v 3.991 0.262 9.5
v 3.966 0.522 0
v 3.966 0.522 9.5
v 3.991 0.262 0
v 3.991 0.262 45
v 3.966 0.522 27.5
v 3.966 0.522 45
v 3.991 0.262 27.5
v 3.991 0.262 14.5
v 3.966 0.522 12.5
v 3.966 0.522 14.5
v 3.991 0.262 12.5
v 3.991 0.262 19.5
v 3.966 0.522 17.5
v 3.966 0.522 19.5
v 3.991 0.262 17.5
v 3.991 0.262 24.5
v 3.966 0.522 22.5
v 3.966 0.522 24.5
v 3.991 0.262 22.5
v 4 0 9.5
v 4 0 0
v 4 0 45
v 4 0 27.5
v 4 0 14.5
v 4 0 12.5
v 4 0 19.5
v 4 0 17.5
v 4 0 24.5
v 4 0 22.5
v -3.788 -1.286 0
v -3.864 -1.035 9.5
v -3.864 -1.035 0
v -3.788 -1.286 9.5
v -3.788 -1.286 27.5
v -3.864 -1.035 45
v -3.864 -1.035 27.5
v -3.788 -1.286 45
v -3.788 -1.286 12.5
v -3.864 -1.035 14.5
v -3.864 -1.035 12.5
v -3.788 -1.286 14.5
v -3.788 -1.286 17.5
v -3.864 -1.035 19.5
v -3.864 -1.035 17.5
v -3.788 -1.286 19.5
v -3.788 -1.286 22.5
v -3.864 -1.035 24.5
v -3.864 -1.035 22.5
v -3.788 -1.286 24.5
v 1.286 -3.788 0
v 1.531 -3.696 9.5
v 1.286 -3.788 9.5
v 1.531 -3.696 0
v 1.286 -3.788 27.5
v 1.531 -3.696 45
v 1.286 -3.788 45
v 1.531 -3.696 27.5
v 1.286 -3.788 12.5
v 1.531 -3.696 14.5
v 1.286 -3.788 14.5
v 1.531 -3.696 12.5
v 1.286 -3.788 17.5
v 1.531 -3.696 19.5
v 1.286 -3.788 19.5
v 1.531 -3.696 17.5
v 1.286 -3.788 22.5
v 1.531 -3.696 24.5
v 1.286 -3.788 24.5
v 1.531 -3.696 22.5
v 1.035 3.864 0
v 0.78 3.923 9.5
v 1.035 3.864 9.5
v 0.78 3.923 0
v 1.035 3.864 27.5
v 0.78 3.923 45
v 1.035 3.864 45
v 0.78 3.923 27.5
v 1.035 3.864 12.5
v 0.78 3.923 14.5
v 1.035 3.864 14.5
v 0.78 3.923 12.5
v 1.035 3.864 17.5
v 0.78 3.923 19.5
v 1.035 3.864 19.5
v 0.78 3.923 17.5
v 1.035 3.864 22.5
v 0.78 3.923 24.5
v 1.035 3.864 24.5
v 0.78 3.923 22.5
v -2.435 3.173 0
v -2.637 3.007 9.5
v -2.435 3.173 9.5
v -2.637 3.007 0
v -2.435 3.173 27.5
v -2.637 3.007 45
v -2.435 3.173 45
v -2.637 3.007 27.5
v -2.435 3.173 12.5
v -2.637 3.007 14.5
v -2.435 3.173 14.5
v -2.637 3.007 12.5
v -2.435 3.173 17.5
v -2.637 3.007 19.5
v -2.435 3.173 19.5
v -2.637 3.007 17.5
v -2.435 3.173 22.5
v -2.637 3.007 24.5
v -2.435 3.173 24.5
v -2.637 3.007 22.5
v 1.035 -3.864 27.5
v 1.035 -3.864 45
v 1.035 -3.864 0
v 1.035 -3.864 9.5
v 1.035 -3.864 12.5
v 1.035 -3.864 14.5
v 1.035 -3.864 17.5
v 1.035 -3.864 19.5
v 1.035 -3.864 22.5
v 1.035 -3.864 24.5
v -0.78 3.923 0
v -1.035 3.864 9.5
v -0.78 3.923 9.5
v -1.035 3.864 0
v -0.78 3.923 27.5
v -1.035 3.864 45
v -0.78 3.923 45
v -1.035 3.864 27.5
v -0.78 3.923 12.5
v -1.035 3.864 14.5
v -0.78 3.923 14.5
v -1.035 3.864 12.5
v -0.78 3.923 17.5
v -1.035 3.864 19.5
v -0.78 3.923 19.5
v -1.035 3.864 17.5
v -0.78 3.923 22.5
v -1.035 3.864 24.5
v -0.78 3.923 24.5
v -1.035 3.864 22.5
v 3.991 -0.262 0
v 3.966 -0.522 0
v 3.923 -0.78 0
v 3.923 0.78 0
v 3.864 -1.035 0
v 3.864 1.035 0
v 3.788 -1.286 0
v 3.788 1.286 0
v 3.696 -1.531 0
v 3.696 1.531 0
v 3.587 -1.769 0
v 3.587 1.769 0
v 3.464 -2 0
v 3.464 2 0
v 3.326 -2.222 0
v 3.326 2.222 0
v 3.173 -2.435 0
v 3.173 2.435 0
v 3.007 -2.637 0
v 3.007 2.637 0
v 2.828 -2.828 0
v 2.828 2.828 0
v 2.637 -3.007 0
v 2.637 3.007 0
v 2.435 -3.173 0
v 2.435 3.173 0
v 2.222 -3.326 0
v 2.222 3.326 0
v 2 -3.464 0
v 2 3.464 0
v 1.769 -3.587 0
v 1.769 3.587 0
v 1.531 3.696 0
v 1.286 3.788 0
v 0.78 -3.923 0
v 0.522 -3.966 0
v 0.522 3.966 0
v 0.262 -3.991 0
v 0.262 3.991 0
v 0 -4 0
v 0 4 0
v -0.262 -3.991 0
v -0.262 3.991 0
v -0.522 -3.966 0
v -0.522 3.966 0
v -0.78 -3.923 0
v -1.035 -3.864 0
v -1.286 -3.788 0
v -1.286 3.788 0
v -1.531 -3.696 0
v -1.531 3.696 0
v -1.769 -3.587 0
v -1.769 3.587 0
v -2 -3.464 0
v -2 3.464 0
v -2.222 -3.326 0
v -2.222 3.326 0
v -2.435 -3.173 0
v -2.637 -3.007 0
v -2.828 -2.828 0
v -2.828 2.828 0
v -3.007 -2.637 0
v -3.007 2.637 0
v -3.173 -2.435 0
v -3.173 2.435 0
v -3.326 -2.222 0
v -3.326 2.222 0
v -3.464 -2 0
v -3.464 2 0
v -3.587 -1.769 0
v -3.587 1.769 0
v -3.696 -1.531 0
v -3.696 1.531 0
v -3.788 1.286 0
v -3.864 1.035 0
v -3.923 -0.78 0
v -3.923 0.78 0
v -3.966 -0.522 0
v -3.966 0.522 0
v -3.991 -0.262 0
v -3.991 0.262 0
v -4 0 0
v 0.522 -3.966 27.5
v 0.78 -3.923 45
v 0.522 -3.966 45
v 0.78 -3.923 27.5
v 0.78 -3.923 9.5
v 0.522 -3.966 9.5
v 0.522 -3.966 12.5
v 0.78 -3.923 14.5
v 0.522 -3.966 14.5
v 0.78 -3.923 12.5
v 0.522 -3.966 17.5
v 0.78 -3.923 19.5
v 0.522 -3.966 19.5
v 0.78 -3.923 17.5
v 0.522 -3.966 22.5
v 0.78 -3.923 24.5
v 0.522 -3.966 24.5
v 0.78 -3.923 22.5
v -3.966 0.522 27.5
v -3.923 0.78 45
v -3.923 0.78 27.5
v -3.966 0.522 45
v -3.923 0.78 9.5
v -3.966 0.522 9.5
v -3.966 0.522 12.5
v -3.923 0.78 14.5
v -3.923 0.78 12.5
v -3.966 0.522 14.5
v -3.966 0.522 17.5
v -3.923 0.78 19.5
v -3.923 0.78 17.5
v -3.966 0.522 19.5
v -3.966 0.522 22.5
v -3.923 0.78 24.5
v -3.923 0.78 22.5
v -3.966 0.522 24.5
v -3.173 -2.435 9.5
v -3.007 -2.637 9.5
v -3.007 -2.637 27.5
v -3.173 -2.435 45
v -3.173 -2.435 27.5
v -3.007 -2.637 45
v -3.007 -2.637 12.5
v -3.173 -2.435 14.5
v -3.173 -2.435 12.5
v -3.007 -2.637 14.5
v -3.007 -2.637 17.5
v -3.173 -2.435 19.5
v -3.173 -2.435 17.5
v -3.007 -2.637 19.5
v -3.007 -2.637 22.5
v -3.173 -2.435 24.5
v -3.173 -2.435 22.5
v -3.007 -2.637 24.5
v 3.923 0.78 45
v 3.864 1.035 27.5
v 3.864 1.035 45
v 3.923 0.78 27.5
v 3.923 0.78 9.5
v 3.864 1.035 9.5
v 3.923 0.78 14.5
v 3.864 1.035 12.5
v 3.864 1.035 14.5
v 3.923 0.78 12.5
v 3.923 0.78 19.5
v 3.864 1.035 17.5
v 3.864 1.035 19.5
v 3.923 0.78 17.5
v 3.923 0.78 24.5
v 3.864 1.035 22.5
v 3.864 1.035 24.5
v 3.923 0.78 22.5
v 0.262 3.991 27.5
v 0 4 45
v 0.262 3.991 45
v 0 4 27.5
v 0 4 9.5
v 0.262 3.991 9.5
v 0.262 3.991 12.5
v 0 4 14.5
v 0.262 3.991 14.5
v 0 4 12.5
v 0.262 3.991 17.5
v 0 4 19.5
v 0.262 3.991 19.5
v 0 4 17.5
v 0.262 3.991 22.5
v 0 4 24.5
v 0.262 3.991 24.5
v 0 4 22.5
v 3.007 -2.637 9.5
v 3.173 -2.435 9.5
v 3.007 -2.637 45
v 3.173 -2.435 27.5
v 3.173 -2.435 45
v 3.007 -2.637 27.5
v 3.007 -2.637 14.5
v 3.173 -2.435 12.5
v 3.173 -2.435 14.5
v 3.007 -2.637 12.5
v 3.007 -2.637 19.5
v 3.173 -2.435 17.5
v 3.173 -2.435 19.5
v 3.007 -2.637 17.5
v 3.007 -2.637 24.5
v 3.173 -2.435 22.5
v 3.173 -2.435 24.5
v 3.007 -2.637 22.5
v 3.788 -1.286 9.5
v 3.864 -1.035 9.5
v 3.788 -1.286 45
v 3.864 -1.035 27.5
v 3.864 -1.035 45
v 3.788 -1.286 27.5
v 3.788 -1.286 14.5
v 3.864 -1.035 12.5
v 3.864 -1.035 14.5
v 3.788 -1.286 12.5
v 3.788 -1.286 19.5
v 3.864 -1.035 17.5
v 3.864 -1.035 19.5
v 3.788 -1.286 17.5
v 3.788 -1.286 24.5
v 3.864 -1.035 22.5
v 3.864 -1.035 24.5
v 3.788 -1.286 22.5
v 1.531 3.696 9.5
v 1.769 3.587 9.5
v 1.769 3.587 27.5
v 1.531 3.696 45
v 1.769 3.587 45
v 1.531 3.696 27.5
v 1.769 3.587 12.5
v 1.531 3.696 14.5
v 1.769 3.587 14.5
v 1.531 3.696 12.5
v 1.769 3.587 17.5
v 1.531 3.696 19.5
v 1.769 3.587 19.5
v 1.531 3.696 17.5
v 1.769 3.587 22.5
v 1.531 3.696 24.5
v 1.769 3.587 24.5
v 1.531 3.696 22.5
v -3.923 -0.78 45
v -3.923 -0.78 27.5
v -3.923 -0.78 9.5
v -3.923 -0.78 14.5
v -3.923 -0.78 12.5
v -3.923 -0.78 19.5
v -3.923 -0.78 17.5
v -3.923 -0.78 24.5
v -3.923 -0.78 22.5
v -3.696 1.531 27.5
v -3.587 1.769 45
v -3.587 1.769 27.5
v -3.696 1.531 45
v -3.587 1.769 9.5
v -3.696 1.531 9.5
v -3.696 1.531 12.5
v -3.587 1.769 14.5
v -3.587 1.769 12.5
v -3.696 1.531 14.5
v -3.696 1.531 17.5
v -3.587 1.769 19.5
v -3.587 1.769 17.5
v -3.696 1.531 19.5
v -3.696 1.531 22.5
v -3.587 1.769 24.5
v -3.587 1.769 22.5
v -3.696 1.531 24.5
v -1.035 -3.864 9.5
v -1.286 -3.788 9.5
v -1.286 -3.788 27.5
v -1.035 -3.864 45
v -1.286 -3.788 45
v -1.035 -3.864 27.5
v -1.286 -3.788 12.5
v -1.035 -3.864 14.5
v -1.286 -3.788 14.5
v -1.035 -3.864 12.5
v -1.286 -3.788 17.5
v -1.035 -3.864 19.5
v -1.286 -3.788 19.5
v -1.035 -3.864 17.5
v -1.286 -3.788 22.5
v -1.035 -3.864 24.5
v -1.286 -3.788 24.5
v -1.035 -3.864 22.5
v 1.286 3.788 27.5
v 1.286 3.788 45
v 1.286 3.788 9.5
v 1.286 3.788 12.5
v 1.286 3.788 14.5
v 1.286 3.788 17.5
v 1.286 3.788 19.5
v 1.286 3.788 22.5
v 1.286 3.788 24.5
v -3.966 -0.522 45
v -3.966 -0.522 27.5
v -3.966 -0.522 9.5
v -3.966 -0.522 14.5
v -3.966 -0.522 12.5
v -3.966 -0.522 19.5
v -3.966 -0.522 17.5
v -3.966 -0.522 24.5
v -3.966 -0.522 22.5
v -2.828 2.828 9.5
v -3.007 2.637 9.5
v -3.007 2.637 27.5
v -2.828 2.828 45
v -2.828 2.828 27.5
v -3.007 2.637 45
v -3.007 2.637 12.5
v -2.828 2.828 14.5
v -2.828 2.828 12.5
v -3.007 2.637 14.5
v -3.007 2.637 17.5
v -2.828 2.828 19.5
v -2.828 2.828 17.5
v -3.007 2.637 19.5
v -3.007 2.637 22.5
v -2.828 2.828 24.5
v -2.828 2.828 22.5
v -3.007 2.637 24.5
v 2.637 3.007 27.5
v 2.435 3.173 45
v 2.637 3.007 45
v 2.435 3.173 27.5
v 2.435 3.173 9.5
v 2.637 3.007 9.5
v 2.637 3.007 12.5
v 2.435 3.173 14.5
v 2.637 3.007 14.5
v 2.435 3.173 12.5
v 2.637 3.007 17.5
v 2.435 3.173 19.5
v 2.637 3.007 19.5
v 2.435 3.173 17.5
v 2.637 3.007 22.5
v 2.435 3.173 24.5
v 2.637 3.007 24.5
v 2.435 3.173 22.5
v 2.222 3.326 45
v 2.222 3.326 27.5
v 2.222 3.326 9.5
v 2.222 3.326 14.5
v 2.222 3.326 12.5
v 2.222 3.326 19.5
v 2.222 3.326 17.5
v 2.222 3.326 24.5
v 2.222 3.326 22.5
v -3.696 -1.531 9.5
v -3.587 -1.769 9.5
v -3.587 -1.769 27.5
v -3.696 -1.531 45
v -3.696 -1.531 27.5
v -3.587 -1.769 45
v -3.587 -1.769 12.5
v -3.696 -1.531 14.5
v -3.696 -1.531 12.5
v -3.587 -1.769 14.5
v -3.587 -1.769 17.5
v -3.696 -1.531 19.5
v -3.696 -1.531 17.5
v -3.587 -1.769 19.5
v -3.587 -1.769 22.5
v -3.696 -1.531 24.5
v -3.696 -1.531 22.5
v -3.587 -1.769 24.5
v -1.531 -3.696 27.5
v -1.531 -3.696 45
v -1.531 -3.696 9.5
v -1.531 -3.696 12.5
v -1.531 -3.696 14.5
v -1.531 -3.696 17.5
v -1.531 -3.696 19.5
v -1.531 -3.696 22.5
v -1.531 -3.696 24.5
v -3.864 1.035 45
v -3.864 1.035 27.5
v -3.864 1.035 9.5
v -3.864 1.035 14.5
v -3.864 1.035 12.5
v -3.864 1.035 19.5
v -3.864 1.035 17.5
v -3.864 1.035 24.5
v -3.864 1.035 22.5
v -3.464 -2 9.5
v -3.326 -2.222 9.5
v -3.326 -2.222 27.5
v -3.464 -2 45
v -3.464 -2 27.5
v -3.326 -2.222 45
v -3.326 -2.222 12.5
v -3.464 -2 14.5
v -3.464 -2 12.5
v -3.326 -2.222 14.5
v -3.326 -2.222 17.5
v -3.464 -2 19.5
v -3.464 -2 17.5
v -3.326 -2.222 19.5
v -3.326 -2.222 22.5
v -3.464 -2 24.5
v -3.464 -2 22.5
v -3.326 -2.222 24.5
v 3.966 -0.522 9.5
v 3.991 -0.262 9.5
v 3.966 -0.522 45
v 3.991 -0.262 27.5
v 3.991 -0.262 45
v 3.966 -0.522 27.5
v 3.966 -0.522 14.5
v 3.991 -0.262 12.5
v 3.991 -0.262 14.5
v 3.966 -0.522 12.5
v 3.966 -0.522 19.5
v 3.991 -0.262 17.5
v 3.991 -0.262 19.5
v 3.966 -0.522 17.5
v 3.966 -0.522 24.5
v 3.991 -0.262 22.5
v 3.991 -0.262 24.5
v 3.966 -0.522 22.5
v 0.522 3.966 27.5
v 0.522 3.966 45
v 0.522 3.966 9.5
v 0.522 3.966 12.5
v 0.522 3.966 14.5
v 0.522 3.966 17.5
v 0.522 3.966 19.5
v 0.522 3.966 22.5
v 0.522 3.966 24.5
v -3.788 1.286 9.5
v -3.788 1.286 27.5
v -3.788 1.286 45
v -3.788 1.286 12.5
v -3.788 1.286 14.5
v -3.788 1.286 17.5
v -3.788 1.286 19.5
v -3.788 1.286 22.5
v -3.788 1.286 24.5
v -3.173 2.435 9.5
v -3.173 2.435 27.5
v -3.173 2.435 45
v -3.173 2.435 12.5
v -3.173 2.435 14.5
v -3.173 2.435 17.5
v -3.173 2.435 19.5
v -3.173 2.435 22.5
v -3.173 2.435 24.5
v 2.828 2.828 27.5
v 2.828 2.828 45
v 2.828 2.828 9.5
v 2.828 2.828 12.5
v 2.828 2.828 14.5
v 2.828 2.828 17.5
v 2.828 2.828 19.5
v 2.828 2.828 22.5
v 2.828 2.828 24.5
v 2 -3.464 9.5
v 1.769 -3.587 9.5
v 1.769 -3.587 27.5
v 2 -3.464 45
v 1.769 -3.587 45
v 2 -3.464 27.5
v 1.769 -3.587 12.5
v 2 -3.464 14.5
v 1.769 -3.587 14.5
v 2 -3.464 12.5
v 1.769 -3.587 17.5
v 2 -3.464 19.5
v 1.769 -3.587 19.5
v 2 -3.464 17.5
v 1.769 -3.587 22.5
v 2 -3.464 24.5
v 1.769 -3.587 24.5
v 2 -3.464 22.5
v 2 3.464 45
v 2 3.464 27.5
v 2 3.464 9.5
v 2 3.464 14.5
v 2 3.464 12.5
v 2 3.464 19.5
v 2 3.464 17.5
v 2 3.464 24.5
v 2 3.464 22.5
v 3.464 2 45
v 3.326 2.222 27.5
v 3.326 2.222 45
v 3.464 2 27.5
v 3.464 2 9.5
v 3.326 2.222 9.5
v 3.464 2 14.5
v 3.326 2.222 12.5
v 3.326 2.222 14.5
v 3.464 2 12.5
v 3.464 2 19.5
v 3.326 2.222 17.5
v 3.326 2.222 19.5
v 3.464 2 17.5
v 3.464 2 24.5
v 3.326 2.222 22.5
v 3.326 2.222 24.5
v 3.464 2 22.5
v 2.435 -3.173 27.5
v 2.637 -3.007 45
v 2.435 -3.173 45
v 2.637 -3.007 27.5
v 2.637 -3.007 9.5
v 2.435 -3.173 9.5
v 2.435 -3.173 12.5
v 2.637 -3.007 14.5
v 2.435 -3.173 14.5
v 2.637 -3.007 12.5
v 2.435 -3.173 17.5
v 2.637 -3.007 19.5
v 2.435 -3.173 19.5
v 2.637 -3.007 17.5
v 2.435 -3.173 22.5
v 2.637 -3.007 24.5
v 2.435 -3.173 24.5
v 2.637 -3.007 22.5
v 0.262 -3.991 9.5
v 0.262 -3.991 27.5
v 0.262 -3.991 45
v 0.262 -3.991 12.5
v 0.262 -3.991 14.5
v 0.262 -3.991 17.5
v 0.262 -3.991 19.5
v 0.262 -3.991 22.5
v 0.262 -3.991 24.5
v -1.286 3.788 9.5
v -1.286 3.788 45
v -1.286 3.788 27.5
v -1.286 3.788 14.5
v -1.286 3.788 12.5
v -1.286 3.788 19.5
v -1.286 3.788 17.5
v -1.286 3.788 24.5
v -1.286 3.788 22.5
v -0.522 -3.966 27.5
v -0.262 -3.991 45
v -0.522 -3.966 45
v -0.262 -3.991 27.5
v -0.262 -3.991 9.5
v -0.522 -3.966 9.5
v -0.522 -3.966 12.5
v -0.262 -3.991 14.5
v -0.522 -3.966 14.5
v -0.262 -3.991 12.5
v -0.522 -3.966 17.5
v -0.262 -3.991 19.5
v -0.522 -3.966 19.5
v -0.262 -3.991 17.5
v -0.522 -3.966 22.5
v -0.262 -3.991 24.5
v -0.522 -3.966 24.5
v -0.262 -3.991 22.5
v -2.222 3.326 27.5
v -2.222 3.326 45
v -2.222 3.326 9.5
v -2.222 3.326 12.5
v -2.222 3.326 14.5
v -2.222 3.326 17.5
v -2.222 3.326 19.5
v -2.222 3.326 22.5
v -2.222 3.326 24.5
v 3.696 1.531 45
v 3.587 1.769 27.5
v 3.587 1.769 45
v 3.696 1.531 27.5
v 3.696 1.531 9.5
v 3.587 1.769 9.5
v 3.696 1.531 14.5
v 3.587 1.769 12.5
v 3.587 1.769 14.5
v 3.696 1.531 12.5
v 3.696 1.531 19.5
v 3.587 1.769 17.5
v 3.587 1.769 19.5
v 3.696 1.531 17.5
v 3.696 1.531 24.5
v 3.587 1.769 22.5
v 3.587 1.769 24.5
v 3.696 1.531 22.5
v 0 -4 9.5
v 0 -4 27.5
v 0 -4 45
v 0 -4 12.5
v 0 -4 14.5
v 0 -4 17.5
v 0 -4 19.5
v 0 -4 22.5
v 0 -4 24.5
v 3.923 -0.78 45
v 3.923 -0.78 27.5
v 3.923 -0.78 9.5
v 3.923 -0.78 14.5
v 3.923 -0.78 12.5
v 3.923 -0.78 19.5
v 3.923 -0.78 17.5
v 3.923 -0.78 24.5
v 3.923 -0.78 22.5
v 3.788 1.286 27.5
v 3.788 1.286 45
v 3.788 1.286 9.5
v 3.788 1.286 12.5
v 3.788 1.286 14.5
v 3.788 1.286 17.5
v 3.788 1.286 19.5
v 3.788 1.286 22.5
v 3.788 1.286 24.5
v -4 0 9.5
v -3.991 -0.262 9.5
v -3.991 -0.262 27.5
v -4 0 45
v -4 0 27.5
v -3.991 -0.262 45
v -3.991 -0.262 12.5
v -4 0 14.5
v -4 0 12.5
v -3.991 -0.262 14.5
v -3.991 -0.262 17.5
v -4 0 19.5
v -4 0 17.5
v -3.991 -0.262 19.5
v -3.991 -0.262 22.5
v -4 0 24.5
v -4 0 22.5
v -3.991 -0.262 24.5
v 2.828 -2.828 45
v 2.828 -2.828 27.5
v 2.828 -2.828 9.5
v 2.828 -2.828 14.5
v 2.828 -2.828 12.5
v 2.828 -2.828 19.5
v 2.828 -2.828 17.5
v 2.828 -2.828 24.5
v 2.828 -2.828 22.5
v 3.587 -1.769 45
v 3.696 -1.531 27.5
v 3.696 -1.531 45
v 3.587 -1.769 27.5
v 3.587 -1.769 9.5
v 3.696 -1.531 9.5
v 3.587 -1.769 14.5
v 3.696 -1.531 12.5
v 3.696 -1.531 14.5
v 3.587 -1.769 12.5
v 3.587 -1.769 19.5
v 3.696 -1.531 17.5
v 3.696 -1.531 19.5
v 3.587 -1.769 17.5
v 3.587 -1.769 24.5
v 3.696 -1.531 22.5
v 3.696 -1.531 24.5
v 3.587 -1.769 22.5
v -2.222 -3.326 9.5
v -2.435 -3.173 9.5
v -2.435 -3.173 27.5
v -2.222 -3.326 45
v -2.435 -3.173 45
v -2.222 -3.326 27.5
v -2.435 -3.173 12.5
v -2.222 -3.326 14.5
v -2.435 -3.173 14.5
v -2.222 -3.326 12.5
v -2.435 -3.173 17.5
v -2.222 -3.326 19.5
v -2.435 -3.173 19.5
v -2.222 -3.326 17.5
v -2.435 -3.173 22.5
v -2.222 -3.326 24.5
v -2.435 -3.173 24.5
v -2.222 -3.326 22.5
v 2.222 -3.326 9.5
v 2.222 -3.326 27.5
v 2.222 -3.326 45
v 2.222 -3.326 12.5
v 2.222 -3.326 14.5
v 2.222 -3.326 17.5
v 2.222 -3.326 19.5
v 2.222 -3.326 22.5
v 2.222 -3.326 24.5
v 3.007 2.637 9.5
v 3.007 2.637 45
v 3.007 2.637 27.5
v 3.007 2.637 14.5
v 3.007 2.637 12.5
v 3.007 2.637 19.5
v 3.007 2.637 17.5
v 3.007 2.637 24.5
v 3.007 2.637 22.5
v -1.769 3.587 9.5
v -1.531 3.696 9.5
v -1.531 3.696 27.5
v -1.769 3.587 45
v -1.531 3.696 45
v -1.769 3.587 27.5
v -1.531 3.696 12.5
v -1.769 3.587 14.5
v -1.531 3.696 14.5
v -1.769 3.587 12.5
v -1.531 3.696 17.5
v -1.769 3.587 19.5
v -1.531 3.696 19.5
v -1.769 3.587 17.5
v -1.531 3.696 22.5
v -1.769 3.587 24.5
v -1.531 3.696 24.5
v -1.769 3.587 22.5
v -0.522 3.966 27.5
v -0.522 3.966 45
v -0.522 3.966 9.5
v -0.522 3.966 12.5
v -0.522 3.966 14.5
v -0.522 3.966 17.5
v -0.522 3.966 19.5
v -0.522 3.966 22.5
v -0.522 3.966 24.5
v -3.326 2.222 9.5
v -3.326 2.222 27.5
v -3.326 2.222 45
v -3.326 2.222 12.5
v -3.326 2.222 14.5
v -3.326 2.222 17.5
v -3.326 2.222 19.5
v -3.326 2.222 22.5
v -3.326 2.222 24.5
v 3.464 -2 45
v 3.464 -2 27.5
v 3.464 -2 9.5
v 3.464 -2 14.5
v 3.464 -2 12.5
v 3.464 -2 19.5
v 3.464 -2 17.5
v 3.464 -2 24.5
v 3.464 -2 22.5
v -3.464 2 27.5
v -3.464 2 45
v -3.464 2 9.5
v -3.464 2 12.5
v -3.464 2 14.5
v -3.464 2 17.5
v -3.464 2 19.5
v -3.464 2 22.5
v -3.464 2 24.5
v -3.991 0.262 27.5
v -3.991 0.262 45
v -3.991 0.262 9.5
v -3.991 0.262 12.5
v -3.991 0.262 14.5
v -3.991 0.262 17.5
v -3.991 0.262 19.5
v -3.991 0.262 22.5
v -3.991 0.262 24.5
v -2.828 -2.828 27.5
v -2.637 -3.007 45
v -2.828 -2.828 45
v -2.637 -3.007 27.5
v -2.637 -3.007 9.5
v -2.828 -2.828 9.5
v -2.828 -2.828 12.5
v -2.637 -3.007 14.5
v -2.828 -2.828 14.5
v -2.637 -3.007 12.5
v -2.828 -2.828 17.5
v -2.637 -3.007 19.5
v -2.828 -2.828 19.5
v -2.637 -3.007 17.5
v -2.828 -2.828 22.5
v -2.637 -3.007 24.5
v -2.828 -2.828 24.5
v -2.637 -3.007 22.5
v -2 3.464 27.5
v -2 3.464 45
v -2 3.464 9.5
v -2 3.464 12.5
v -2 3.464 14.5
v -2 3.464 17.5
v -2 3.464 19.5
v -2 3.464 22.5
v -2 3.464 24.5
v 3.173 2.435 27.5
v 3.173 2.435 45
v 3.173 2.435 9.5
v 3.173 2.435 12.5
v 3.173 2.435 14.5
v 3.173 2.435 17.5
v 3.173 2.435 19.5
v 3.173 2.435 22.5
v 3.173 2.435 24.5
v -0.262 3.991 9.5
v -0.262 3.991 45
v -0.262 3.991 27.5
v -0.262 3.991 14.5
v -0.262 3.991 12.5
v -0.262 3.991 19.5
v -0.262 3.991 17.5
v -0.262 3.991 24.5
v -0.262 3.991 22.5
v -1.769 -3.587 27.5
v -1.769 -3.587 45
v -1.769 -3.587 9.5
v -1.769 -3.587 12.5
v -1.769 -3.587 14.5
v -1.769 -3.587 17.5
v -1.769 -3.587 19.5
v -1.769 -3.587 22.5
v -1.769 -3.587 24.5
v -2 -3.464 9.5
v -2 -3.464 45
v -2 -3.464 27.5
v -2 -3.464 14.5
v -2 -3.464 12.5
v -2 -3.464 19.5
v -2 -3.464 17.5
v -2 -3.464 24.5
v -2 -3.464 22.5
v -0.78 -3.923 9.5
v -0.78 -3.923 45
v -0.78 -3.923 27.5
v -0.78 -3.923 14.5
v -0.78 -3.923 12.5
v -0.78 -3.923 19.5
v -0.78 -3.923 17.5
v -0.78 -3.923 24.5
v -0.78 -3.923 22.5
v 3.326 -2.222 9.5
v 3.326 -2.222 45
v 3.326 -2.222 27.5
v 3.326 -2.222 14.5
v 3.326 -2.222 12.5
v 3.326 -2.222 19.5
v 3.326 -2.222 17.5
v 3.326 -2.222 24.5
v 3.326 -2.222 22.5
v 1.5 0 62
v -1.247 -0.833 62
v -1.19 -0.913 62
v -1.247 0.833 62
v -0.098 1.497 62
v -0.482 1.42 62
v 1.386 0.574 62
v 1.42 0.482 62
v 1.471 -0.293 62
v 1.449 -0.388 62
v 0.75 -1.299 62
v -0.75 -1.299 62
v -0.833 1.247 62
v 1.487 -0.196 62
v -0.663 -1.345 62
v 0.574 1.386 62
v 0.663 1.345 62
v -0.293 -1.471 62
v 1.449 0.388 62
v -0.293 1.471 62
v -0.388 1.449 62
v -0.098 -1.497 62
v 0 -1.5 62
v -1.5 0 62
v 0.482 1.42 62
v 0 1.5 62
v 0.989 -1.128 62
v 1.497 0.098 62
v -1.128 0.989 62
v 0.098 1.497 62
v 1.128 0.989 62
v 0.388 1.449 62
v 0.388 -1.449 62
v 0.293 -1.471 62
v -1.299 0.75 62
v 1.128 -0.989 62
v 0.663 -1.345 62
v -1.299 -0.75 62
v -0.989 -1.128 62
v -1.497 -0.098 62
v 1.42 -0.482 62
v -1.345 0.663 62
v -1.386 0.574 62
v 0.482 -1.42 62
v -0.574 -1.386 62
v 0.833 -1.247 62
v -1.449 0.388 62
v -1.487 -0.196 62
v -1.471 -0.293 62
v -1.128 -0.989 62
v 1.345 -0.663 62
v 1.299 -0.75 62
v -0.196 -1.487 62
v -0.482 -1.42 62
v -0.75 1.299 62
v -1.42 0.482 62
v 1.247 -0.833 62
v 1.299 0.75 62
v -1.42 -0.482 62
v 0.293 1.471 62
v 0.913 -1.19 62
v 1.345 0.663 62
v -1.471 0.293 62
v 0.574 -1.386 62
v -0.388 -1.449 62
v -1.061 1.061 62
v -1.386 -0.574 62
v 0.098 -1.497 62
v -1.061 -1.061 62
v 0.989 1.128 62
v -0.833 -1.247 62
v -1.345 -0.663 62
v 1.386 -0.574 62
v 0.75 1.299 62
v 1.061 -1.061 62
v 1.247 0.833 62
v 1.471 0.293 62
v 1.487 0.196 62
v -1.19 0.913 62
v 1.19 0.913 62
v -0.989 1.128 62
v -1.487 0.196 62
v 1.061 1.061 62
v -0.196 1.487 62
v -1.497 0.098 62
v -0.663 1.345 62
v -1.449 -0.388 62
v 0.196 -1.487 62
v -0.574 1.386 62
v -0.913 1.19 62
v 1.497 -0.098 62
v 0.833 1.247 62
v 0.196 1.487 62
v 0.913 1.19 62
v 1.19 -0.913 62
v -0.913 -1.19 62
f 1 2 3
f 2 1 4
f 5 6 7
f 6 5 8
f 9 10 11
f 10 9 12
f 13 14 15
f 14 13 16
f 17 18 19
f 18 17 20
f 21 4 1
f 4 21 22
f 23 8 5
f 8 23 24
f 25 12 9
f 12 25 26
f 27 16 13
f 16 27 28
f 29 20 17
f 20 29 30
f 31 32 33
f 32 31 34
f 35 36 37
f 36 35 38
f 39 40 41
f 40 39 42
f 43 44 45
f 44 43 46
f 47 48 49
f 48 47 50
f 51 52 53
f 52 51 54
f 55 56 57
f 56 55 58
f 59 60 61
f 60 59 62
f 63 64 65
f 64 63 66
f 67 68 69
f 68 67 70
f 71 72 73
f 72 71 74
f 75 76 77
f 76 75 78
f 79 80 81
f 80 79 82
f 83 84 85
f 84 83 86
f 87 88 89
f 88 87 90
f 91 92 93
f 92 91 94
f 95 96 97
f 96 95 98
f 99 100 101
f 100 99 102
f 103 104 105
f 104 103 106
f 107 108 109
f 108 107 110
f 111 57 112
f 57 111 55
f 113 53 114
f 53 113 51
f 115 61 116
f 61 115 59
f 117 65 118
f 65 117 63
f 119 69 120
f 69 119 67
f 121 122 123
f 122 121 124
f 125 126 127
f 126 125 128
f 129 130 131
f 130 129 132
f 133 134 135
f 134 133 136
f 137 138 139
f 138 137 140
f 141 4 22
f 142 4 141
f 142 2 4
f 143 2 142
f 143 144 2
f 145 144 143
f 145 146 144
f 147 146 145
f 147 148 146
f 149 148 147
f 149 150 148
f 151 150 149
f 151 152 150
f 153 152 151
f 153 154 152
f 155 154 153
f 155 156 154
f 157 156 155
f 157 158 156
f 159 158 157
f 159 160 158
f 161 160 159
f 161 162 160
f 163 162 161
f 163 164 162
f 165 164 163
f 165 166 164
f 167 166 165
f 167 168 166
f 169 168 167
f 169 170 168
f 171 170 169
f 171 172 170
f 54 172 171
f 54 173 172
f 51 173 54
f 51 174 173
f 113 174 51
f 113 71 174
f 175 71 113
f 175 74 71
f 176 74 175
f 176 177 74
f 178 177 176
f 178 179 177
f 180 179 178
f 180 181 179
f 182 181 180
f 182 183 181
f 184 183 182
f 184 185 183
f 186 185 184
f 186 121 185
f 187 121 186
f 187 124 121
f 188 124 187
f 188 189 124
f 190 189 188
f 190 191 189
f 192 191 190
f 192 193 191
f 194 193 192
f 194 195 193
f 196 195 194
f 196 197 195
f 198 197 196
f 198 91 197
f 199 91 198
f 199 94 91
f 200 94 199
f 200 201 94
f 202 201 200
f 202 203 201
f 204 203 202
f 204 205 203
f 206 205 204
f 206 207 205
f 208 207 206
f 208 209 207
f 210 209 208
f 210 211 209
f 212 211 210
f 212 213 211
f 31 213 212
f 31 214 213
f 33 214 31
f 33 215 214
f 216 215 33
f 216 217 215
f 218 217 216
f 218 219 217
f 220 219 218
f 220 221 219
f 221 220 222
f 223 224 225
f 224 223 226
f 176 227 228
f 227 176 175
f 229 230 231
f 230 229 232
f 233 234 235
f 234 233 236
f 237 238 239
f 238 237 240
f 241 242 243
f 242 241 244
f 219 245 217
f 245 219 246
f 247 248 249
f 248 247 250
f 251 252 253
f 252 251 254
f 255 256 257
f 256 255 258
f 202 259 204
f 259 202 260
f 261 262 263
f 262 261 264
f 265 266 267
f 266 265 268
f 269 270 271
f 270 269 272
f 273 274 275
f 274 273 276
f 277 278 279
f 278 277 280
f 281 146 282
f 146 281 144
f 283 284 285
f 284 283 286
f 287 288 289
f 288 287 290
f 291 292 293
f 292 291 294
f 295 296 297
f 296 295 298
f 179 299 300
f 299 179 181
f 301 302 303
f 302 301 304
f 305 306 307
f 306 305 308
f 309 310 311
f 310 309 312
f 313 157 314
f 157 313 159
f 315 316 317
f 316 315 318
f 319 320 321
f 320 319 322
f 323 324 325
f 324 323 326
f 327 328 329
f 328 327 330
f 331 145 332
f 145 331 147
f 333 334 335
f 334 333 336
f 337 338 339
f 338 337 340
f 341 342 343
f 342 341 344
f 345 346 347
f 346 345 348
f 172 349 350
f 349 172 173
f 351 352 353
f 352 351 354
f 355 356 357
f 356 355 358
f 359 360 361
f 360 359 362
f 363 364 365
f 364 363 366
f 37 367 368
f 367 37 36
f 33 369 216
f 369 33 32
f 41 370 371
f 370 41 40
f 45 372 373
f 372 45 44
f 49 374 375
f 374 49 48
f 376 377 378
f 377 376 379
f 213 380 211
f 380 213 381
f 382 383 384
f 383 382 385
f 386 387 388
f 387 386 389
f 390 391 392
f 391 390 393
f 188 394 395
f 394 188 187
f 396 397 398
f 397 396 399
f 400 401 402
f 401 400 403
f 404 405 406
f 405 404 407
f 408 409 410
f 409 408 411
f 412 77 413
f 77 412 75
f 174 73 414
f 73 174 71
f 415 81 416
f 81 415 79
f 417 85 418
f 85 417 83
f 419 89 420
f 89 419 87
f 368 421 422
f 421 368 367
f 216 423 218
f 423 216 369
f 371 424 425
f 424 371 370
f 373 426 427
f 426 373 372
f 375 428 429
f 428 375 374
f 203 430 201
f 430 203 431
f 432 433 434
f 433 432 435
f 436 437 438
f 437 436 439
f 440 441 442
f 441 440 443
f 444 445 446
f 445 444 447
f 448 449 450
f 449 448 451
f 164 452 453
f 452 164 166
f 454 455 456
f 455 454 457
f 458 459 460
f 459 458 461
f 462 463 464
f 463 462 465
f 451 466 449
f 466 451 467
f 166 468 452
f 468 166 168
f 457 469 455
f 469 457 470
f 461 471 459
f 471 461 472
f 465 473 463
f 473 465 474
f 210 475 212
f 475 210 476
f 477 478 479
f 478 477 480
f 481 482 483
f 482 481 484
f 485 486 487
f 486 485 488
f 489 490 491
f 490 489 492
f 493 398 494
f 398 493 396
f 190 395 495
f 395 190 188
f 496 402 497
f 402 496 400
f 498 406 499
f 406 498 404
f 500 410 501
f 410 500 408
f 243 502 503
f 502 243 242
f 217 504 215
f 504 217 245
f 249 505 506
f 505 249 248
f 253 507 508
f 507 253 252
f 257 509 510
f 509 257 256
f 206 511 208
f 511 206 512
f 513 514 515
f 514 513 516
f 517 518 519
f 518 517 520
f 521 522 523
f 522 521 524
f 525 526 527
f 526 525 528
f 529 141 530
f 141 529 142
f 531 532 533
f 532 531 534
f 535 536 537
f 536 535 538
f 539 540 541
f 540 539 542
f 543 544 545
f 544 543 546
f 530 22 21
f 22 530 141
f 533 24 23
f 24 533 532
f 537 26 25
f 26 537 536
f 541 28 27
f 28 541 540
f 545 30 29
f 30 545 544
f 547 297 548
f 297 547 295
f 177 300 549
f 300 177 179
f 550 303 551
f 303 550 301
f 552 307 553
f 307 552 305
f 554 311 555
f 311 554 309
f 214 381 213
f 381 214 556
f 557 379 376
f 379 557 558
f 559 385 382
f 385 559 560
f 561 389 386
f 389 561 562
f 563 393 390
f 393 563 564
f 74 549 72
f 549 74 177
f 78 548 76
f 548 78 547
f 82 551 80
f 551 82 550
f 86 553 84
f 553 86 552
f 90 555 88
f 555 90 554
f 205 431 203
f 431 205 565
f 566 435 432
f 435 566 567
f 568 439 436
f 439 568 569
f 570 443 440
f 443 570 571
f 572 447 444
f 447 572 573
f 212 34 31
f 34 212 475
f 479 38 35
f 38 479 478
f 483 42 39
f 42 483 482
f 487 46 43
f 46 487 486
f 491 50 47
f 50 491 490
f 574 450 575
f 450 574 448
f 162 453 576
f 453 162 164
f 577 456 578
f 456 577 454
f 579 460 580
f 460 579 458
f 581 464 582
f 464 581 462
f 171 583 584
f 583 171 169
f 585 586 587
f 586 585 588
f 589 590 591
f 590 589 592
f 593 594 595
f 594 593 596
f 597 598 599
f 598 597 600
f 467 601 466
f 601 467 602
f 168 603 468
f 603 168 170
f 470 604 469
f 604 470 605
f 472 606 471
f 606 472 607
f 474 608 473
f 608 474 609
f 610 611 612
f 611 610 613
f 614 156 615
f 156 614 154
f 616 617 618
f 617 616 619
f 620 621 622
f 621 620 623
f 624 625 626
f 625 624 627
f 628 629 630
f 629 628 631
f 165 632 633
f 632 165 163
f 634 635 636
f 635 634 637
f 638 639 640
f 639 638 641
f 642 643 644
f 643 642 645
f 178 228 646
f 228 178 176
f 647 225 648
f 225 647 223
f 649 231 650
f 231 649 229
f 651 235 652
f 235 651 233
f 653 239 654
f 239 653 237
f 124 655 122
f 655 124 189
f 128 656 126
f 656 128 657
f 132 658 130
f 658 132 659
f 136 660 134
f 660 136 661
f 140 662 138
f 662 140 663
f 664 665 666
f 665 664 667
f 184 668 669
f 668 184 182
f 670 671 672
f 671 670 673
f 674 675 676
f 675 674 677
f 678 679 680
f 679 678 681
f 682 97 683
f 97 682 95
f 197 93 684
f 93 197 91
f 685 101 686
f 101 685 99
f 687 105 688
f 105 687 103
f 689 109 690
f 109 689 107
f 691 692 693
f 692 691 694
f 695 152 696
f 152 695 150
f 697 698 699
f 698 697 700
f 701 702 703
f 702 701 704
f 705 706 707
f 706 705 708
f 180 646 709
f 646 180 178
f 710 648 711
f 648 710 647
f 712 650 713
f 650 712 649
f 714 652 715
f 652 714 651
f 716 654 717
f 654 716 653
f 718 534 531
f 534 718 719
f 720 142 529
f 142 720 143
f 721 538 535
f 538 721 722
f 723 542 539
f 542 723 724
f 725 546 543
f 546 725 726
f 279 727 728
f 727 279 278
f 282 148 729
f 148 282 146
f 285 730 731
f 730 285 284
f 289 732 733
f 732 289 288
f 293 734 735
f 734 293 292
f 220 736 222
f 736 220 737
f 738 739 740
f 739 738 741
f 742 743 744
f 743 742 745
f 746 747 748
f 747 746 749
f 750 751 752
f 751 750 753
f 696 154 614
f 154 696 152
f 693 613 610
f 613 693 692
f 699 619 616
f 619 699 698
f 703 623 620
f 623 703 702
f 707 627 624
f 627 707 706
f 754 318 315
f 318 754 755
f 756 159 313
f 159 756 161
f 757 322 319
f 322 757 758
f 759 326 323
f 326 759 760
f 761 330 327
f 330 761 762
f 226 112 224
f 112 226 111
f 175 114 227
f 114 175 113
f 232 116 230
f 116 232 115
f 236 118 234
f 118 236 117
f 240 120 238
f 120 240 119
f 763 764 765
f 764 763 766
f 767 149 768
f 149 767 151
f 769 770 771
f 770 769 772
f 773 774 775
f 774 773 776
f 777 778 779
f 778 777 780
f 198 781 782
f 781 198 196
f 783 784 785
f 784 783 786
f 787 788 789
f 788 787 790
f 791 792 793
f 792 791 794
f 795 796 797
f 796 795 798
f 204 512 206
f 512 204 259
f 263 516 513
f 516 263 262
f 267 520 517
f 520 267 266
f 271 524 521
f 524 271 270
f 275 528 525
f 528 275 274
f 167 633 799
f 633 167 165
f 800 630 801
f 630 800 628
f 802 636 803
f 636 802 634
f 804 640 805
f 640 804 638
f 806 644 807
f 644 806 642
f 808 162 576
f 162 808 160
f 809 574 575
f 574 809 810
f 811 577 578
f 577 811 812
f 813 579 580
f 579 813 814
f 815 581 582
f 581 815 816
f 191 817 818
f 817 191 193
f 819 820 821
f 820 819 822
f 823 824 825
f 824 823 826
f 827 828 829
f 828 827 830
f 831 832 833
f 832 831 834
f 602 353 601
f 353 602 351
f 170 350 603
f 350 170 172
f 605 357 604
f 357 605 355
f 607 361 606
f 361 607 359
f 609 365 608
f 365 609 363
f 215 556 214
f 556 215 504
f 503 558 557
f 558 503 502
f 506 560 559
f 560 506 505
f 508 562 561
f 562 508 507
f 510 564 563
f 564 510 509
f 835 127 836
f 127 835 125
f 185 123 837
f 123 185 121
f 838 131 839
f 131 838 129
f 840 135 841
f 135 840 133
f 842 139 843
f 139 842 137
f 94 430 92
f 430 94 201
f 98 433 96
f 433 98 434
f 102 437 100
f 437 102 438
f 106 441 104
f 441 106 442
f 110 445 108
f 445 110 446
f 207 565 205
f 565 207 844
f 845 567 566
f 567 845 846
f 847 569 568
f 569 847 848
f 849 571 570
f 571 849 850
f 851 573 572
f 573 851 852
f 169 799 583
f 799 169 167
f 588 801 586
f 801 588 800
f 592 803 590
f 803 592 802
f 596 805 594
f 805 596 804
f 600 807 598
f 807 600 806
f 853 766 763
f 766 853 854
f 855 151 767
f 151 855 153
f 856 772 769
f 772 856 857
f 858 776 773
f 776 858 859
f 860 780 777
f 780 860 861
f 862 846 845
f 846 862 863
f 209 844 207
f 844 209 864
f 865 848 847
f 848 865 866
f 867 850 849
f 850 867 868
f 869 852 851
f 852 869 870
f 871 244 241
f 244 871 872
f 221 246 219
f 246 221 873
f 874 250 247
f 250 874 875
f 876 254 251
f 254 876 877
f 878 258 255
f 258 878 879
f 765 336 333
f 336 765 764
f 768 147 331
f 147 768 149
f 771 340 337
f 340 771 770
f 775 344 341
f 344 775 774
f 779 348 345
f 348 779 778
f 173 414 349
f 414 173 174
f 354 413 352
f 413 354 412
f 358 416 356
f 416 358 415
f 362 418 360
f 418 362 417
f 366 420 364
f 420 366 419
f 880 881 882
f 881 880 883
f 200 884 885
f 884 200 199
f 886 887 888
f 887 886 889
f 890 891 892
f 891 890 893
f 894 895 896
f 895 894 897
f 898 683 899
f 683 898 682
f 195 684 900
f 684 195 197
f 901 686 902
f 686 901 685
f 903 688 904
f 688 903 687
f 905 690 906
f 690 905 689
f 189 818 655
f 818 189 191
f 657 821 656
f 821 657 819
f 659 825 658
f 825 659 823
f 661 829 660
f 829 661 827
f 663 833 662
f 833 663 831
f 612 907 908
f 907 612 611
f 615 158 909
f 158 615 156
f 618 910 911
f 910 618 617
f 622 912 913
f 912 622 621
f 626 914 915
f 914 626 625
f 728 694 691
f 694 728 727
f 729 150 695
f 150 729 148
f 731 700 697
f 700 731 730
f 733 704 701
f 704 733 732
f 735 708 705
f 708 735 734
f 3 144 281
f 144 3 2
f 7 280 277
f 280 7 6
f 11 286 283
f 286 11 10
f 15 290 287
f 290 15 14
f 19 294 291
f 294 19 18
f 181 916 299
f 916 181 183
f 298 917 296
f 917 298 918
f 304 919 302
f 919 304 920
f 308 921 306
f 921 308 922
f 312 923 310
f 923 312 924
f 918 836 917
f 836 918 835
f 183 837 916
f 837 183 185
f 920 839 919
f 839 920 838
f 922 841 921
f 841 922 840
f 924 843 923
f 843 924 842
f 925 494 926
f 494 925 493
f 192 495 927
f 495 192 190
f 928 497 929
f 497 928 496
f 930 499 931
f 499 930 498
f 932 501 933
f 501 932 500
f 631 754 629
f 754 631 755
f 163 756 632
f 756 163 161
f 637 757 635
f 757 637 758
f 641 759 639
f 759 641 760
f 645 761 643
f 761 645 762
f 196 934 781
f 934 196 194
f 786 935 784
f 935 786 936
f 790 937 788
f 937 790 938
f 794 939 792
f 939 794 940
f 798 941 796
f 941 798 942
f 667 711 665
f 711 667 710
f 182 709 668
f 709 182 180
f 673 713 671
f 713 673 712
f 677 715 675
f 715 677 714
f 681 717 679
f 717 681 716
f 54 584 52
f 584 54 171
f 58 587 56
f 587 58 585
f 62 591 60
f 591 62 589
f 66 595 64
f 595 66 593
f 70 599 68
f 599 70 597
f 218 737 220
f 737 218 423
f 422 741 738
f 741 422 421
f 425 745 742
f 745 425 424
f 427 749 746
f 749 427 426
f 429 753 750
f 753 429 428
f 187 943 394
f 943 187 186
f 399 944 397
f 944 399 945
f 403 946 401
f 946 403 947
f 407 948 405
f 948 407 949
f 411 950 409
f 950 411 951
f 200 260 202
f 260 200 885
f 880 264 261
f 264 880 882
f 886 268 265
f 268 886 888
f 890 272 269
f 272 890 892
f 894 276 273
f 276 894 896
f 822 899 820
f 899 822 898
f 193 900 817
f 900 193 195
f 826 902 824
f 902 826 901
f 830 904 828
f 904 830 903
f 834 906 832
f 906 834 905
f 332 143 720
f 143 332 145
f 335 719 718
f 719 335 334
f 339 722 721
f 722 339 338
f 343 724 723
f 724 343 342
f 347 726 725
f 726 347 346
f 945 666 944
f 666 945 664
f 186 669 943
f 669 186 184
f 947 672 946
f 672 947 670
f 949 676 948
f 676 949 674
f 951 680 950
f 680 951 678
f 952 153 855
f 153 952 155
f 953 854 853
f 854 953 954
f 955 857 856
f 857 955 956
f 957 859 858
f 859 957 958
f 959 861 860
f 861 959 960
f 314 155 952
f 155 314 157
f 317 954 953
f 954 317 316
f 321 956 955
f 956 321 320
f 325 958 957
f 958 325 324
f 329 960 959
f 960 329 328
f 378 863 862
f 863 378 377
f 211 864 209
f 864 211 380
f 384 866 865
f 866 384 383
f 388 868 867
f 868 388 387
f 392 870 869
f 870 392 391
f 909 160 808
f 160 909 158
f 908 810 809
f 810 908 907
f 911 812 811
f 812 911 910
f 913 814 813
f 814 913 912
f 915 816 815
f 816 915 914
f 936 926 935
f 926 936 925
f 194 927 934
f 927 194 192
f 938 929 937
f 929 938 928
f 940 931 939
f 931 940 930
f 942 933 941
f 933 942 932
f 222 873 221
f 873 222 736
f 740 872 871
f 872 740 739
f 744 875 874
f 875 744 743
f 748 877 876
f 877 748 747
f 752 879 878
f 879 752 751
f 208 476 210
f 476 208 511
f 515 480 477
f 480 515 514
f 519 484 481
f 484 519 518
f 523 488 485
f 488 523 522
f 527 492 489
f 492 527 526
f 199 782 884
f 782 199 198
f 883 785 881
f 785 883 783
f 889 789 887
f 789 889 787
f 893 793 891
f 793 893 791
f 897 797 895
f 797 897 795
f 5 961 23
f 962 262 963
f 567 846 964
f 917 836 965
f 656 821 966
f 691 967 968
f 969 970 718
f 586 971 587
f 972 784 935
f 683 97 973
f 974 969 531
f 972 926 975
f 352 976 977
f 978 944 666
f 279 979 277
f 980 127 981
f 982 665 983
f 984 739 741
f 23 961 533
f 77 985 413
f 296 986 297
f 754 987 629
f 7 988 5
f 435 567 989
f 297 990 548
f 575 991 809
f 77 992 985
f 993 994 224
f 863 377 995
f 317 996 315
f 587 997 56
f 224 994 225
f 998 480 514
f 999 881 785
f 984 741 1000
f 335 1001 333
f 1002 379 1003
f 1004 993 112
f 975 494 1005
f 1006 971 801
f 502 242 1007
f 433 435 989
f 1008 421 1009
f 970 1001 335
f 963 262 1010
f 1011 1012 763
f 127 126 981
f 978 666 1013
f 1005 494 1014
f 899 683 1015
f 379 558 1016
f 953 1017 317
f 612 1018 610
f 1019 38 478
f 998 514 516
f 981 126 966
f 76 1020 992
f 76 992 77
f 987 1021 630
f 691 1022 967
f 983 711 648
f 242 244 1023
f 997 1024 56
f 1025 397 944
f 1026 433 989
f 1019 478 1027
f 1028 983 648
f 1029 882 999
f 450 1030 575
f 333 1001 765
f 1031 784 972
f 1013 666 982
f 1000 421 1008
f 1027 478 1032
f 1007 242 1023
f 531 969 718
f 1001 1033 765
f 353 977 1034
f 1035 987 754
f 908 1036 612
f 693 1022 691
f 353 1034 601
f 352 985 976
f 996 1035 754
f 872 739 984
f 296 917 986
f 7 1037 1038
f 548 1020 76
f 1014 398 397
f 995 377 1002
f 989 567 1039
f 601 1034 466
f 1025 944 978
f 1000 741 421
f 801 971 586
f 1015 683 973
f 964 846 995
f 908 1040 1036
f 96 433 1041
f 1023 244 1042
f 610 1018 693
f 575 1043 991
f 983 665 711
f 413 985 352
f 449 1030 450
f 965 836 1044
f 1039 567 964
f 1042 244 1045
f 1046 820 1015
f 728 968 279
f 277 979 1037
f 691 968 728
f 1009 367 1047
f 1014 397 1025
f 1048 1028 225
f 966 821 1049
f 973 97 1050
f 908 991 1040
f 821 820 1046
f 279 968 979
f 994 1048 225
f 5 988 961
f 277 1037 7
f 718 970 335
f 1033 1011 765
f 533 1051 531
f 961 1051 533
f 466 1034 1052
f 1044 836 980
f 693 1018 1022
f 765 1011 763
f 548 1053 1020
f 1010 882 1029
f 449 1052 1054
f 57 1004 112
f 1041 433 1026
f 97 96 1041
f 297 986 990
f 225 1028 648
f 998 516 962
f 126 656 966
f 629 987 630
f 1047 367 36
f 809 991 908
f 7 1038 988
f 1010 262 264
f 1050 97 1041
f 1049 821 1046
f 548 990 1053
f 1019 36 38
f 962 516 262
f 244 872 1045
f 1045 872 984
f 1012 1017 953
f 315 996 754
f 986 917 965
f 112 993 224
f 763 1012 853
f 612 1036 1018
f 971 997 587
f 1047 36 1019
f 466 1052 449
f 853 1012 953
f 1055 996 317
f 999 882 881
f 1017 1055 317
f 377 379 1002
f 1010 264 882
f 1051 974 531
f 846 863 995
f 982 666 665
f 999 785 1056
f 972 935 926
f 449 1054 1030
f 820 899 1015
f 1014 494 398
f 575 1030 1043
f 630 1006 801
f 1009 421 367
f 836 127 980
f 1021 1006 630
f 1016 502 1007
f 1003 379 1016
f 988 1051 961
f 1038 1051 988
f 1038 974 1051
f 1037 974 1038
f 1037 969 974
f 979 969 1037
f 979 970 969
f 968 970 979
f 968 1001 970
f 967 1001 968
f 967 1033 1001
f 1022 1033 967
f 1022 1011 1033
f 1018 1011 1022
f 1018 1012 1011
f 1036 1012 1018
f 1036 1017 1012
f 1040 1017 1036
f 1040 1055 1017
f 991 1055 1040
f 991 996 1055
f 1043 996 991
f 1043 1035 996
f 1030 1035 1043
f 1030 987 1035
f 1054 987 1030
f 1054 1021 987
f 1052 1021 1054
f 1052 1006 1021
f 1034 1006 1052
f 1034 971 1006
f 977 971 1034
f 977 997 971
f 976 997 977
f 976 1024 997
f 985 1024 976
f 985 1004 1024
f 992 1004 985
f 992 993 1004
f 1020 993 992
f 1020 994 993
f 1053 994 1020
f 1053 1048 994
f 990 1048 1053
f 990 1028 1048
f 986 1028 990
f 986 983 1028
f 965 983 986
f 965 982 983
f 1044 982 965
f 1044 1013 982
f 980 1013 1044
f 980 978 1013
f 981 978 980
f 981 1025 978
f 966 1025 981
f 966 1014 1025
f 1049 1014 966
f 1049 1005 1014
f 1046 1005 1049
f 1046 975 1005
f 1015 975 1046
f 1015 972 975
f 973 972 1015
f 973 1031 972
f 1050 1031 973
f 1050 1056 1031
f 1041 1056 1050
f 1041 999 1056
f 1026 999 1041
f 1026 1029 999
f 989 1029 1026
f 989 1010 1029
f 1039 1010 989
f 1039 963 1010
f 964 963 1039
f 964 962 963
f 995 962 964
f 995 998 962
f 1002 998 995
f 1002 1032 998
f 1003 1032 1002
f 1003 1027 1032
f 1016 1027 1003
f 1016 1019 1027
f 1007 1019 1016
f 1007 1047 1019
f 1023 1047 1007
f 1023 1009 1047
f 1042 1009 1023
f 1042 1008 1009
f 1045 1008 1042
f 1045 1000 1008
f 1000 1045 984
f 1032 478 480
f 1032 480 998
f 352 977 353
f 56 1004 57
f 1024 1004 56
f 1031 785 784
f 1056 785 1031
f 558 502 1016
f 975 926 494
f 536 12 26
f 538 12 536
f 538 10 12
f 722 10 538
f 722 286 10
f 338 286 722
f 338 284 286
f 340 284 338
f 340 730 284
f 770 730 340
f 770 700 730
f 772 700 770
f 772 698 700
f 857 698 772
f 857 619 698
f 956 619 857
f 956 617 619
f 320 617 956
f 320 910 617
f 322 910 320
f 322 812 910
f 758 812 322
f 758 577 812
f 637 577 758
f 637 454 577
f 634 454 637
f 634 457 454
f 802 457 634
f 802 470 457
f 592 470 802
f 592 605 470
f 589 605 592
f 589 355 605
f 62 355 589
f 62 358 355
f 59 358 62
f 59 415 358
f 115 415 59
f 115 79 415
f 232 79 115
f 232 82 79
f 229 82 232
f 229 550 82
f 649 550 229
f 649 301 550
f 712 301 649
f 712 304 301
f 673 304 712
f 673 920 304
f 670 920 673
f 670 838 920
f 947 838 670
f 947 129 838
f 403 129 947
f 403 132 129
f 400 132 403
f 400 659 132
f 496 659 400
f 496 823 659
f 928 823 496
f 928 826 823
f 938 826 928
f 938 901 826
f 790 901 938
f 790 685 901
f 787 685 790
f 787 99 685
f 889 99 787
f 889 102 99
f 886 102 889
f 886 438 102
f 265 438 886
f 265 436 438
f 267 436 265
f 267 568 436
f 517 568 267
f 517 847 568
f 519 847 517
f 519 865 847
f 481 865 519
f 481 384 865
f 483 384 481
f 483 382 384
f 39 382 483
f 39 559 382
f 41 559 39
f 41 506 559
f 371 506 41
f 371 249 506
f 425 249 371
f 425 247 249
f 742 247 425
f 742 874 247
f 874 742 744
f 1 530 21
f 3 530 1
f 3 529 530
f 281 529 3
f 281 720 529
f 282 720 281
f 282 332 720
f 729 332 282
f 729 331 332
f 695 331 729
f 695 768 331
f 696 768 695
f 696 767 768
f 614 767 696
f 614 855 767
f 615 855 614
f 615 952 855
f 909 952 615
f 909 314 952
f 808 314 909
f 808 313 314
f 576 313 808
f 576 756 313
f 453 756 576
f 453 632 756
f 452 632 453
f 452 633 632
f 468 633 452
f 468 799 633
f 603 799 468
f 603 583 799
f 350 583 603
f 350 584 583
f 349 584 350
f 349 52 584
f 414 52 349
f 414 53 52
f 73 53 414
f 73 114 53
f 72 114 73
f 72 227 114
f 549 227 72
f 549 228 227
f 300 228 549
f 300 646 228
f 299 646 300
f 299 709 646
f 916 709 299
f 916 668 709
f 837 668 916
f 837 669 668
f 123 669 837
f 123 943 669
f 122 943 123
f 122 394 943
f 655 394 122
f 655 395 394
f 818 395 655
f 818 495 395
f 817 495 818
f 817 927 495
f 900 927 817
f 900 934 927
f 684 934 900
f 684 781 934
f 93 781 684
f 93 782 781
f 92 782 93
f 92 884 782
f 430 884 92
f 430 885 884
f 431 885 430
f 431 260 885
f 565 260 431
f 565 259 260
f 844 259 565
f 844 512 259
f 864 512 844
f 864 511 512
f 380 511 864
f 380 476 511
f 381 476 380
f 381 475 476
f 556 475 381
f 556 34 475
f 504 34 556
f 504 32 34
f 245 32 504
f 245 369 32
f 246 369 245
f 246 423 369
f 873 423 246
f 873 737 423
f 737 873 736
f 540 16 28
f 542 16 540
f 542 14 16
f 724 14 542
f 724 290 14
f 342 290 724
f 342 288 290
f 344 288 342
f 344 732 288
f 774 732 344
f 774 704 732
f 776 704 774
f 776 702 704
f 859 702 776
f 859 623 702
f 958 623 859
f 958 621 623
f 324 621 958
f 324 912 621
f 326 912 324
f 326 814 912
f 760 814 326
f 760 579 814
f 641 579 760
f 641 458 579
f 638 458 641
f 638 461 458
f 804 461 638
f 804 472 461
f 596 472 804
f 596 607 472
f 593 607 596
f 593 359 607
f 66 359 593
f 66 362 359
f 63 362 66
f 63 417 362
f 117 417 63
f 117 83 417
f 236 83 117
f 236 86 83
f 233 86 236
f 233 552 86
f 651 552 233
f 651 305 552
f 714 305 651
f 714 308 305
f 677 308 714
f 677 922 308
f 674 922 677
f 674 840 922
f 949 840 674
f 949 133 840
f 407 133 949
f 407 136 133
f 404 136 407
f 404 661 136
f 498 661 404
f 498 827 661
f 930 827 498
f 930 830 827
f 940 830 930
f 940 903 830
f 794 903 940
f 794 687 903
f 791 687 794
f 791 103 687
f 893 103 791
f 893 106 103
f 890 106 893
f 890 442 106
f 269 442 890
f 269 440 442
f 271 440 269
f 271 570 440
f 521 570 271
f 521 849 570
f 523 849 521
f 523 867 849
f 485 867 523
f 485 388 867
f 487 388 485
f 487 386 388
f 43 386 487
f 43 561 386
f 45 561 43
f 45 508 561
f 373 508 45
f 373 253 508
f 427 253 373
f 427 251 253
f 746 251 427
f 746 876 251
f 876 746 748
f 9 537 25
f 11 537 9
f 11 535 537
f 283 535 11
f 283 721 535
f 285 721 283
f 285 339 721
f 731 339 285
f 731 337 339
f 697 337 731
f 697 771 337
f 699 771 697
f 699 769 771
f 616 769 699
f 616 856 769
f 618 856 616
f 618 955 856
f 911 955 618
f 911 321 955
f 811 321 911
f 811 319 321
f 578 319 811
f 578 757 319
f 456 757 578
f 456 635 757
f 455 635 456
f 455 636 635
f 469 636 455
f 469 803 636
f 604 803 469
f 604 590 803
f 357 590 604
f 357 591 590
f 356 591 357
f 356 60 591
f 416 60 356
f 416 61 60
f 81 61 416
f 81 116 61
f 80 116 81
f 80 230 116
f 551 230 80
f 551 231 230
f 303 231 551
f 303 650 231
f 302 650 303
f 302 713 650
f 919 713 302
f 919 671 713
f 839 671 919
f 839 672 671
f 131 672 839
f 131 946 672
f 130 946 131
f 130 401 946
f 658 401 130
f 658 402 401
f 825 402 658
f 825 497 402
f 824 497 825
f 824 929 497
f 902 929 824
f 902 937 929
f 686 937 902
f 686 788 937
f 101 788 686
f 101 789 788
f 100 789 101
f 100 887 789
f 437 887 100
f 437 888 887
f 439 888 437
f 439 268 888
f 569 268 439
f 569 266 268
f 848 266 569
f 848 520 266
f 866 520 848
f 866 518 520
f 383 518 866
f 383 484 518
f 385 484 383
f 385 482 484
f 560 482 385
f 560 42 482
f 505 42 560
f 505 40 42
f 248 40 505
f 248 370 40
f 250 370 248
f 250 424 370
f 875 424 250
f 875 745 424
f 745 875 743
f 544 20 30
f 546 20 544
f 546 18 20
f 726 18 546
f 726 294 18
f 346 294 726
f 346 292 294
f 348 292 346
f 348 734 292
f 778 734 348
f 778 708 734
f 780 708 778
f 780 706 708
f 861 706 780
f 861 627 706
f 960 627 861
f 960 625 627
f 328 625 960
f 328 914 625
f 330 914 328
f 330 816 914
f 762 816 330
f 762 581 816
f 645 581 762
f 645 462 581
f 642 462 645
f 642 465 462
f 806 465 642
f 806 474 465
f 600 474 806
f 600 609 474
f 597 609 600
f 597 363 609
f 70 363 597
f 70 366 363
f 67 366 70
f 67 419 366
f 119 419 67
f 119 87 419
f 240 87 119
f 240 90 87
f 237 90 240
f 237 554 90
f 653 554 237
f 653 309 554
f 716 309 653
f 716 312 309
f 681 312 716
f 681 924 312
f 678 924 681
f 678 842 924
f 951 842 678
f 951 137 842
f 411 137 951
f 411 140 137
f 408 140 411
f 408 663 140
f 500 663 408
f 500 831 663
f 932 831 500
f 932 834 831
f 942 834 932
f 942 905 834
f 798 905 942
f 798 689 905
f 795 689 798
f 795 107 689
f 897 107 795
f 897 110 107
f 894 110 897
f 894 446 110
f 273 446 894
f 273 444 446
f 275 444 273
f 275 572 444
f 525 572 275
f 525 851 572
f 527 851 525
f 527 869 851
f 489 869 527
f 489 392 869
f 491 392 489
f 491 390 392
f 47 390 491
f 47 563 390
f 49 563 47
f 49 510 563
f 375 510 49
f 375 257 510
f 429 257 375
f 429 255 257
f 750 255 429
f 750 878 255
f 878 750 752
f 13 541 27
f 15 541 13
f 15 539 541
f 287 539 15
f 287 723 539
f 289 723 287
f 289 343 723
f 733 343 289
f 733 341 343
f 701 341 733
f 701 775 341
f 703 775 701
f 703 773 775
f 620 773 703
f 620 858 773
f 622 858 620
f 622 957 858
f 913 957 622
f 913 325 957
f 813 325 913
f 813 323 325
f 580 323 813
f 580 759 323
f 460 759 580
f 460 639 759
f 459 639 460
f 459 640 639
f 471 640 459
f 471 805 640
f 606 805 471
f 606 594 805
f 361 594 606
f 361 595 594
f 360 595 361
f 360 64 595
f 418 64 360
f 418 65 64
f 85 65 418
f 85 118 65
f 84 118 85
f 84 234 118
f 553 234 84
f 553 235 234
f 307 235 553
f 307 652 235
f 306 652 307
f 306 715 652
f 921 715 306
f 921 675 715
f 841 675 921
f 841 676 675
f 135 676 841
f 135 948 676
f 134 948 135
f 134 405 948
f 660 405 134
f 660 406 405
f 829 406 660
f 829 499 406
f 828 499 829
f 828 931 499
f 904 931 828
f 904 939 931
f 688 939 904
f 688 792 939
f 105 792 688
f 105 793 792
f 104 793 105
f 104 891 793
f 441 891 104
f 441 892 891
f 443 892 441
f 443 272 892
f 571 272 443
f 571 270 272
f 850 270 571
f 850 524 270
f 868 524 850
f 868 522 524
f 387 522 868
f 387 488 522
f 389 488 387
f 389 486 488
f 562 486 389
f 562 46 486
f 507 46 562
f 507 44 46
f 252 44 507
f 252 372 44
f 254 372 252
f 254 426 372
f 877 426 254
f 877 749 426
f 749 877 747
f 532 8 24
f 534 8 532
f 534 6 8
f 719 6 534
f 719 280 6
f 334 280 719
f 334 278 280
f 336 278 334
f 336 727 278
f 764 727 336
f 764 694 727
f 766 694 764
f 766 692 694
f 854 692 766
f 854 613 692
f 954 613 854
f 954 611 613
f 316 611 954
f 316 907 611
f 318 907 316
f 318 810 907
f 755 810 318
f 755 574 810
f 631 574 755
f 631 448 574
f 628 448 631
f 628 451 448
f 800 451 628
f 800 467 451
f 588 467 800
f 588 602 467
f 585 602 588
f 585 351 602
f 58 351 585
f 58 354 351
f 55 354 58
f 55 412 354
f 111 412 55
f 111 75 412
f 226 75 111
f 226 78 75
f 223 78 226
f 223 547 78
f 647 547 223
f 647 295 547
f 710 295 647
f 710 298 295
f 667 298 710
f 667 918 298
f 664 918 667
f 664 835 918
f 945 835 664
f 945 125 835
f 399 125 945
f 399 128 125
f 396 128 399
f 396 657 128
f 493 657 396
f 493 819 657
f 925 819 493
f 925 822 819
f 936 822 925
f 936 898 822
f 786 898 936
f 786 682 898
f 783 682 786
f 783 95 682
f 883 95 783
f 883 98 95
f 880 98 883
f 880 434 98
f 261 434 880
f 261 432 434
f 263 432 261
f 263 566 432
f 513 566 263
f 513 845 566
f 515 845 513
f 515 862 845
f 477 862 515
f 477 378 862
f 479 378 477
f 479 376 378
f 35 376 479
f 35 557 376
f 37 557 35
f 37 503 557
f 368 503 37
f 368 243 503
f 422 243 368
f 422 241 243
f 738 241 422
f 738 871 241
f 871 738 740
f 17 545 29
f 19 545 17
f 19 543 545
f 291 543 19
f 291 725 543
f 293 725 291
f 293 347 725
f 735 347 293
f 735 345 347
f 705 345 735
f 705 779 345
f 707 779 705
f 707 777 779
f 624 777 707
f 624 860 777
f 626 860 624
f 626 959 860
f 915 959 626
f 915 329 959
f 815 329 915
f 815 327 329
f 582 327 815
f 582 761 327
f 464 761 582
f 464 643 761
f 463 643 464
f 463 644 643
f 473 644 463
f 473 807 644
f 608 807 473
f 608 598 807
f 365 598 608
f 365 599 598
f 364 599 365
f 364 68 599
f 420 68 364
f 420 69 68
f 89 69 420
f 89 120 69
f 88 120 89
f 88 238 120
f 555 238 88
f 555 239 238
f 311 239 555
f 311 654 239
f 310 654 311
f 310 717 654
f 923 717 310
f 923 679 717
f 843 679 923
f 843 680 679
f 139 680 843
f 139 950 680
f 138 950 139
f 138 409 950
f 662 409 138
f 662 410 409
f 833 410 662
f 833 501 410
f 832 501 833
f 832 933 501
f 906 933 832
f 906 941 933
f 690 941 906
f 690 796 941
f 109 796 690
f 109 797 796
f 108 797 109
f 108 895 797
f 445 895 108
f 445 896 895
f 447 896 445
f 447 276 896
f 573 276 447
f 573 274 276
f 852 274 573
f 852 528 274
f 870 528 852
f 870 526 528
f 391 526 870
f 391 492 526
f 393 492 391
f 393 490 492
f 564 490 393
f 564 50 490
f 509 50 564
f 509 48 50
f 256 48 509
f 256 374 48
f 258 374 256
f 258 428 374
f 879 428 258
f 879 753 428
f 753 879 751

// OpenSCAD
// Pestle for grinding tissue inside a 1.5 mL microcentrifuge tube
// Printed standing upright: handle at the bottom, rounded tip at the top

// ---------- Dimensions (mm) ----------
handle_d      = 8;     // handle diameter
handle_h      = 45;    // handle length (z = 0 to 45)
cone_top_d    = 8;     // cone diameter where it meets the handle (z = 45)
cone_bottom_d = 3;     // cone diameter at its tip (z = 62)
cone_h        = 17;    // cone height (z = 45 to 62)
tip_r         = 3;     // tip sphere radius, centred at z = 62
groove_w      = 2;     // groove width along Z
groove_depth  = 1;     // groove depth into the handle wall
groove_z      = [10, 15, 20, 25]; // groove centre heights
eps           = 0.5;   // overshoot for clean boolean cuts

$fn = 96;

// ---------- Model ----------
difference() {
    union() {
        // Handle
        cylinder(d = handle_d, h = handle_h);
        // Cone (tapers from 8 mm at z = 45 to 3 mm at z = 62)
        translate([0, 0, handle_h])
            cylinder(d1 = cone_top_d, d2 = cone_bottom_d, h = cone_h);
        // Tip sphere
        translate([0, 0, cone_bottom_d])
            sphere(r = tip_r);
    }

    // Grooves, extended past the faces they cut
    for (z = groove_z)
        translate([0, 0, z - eps])
            cylinder(d = handle_d + 2 * eps, h = groove_w + 2 * eps);
}
